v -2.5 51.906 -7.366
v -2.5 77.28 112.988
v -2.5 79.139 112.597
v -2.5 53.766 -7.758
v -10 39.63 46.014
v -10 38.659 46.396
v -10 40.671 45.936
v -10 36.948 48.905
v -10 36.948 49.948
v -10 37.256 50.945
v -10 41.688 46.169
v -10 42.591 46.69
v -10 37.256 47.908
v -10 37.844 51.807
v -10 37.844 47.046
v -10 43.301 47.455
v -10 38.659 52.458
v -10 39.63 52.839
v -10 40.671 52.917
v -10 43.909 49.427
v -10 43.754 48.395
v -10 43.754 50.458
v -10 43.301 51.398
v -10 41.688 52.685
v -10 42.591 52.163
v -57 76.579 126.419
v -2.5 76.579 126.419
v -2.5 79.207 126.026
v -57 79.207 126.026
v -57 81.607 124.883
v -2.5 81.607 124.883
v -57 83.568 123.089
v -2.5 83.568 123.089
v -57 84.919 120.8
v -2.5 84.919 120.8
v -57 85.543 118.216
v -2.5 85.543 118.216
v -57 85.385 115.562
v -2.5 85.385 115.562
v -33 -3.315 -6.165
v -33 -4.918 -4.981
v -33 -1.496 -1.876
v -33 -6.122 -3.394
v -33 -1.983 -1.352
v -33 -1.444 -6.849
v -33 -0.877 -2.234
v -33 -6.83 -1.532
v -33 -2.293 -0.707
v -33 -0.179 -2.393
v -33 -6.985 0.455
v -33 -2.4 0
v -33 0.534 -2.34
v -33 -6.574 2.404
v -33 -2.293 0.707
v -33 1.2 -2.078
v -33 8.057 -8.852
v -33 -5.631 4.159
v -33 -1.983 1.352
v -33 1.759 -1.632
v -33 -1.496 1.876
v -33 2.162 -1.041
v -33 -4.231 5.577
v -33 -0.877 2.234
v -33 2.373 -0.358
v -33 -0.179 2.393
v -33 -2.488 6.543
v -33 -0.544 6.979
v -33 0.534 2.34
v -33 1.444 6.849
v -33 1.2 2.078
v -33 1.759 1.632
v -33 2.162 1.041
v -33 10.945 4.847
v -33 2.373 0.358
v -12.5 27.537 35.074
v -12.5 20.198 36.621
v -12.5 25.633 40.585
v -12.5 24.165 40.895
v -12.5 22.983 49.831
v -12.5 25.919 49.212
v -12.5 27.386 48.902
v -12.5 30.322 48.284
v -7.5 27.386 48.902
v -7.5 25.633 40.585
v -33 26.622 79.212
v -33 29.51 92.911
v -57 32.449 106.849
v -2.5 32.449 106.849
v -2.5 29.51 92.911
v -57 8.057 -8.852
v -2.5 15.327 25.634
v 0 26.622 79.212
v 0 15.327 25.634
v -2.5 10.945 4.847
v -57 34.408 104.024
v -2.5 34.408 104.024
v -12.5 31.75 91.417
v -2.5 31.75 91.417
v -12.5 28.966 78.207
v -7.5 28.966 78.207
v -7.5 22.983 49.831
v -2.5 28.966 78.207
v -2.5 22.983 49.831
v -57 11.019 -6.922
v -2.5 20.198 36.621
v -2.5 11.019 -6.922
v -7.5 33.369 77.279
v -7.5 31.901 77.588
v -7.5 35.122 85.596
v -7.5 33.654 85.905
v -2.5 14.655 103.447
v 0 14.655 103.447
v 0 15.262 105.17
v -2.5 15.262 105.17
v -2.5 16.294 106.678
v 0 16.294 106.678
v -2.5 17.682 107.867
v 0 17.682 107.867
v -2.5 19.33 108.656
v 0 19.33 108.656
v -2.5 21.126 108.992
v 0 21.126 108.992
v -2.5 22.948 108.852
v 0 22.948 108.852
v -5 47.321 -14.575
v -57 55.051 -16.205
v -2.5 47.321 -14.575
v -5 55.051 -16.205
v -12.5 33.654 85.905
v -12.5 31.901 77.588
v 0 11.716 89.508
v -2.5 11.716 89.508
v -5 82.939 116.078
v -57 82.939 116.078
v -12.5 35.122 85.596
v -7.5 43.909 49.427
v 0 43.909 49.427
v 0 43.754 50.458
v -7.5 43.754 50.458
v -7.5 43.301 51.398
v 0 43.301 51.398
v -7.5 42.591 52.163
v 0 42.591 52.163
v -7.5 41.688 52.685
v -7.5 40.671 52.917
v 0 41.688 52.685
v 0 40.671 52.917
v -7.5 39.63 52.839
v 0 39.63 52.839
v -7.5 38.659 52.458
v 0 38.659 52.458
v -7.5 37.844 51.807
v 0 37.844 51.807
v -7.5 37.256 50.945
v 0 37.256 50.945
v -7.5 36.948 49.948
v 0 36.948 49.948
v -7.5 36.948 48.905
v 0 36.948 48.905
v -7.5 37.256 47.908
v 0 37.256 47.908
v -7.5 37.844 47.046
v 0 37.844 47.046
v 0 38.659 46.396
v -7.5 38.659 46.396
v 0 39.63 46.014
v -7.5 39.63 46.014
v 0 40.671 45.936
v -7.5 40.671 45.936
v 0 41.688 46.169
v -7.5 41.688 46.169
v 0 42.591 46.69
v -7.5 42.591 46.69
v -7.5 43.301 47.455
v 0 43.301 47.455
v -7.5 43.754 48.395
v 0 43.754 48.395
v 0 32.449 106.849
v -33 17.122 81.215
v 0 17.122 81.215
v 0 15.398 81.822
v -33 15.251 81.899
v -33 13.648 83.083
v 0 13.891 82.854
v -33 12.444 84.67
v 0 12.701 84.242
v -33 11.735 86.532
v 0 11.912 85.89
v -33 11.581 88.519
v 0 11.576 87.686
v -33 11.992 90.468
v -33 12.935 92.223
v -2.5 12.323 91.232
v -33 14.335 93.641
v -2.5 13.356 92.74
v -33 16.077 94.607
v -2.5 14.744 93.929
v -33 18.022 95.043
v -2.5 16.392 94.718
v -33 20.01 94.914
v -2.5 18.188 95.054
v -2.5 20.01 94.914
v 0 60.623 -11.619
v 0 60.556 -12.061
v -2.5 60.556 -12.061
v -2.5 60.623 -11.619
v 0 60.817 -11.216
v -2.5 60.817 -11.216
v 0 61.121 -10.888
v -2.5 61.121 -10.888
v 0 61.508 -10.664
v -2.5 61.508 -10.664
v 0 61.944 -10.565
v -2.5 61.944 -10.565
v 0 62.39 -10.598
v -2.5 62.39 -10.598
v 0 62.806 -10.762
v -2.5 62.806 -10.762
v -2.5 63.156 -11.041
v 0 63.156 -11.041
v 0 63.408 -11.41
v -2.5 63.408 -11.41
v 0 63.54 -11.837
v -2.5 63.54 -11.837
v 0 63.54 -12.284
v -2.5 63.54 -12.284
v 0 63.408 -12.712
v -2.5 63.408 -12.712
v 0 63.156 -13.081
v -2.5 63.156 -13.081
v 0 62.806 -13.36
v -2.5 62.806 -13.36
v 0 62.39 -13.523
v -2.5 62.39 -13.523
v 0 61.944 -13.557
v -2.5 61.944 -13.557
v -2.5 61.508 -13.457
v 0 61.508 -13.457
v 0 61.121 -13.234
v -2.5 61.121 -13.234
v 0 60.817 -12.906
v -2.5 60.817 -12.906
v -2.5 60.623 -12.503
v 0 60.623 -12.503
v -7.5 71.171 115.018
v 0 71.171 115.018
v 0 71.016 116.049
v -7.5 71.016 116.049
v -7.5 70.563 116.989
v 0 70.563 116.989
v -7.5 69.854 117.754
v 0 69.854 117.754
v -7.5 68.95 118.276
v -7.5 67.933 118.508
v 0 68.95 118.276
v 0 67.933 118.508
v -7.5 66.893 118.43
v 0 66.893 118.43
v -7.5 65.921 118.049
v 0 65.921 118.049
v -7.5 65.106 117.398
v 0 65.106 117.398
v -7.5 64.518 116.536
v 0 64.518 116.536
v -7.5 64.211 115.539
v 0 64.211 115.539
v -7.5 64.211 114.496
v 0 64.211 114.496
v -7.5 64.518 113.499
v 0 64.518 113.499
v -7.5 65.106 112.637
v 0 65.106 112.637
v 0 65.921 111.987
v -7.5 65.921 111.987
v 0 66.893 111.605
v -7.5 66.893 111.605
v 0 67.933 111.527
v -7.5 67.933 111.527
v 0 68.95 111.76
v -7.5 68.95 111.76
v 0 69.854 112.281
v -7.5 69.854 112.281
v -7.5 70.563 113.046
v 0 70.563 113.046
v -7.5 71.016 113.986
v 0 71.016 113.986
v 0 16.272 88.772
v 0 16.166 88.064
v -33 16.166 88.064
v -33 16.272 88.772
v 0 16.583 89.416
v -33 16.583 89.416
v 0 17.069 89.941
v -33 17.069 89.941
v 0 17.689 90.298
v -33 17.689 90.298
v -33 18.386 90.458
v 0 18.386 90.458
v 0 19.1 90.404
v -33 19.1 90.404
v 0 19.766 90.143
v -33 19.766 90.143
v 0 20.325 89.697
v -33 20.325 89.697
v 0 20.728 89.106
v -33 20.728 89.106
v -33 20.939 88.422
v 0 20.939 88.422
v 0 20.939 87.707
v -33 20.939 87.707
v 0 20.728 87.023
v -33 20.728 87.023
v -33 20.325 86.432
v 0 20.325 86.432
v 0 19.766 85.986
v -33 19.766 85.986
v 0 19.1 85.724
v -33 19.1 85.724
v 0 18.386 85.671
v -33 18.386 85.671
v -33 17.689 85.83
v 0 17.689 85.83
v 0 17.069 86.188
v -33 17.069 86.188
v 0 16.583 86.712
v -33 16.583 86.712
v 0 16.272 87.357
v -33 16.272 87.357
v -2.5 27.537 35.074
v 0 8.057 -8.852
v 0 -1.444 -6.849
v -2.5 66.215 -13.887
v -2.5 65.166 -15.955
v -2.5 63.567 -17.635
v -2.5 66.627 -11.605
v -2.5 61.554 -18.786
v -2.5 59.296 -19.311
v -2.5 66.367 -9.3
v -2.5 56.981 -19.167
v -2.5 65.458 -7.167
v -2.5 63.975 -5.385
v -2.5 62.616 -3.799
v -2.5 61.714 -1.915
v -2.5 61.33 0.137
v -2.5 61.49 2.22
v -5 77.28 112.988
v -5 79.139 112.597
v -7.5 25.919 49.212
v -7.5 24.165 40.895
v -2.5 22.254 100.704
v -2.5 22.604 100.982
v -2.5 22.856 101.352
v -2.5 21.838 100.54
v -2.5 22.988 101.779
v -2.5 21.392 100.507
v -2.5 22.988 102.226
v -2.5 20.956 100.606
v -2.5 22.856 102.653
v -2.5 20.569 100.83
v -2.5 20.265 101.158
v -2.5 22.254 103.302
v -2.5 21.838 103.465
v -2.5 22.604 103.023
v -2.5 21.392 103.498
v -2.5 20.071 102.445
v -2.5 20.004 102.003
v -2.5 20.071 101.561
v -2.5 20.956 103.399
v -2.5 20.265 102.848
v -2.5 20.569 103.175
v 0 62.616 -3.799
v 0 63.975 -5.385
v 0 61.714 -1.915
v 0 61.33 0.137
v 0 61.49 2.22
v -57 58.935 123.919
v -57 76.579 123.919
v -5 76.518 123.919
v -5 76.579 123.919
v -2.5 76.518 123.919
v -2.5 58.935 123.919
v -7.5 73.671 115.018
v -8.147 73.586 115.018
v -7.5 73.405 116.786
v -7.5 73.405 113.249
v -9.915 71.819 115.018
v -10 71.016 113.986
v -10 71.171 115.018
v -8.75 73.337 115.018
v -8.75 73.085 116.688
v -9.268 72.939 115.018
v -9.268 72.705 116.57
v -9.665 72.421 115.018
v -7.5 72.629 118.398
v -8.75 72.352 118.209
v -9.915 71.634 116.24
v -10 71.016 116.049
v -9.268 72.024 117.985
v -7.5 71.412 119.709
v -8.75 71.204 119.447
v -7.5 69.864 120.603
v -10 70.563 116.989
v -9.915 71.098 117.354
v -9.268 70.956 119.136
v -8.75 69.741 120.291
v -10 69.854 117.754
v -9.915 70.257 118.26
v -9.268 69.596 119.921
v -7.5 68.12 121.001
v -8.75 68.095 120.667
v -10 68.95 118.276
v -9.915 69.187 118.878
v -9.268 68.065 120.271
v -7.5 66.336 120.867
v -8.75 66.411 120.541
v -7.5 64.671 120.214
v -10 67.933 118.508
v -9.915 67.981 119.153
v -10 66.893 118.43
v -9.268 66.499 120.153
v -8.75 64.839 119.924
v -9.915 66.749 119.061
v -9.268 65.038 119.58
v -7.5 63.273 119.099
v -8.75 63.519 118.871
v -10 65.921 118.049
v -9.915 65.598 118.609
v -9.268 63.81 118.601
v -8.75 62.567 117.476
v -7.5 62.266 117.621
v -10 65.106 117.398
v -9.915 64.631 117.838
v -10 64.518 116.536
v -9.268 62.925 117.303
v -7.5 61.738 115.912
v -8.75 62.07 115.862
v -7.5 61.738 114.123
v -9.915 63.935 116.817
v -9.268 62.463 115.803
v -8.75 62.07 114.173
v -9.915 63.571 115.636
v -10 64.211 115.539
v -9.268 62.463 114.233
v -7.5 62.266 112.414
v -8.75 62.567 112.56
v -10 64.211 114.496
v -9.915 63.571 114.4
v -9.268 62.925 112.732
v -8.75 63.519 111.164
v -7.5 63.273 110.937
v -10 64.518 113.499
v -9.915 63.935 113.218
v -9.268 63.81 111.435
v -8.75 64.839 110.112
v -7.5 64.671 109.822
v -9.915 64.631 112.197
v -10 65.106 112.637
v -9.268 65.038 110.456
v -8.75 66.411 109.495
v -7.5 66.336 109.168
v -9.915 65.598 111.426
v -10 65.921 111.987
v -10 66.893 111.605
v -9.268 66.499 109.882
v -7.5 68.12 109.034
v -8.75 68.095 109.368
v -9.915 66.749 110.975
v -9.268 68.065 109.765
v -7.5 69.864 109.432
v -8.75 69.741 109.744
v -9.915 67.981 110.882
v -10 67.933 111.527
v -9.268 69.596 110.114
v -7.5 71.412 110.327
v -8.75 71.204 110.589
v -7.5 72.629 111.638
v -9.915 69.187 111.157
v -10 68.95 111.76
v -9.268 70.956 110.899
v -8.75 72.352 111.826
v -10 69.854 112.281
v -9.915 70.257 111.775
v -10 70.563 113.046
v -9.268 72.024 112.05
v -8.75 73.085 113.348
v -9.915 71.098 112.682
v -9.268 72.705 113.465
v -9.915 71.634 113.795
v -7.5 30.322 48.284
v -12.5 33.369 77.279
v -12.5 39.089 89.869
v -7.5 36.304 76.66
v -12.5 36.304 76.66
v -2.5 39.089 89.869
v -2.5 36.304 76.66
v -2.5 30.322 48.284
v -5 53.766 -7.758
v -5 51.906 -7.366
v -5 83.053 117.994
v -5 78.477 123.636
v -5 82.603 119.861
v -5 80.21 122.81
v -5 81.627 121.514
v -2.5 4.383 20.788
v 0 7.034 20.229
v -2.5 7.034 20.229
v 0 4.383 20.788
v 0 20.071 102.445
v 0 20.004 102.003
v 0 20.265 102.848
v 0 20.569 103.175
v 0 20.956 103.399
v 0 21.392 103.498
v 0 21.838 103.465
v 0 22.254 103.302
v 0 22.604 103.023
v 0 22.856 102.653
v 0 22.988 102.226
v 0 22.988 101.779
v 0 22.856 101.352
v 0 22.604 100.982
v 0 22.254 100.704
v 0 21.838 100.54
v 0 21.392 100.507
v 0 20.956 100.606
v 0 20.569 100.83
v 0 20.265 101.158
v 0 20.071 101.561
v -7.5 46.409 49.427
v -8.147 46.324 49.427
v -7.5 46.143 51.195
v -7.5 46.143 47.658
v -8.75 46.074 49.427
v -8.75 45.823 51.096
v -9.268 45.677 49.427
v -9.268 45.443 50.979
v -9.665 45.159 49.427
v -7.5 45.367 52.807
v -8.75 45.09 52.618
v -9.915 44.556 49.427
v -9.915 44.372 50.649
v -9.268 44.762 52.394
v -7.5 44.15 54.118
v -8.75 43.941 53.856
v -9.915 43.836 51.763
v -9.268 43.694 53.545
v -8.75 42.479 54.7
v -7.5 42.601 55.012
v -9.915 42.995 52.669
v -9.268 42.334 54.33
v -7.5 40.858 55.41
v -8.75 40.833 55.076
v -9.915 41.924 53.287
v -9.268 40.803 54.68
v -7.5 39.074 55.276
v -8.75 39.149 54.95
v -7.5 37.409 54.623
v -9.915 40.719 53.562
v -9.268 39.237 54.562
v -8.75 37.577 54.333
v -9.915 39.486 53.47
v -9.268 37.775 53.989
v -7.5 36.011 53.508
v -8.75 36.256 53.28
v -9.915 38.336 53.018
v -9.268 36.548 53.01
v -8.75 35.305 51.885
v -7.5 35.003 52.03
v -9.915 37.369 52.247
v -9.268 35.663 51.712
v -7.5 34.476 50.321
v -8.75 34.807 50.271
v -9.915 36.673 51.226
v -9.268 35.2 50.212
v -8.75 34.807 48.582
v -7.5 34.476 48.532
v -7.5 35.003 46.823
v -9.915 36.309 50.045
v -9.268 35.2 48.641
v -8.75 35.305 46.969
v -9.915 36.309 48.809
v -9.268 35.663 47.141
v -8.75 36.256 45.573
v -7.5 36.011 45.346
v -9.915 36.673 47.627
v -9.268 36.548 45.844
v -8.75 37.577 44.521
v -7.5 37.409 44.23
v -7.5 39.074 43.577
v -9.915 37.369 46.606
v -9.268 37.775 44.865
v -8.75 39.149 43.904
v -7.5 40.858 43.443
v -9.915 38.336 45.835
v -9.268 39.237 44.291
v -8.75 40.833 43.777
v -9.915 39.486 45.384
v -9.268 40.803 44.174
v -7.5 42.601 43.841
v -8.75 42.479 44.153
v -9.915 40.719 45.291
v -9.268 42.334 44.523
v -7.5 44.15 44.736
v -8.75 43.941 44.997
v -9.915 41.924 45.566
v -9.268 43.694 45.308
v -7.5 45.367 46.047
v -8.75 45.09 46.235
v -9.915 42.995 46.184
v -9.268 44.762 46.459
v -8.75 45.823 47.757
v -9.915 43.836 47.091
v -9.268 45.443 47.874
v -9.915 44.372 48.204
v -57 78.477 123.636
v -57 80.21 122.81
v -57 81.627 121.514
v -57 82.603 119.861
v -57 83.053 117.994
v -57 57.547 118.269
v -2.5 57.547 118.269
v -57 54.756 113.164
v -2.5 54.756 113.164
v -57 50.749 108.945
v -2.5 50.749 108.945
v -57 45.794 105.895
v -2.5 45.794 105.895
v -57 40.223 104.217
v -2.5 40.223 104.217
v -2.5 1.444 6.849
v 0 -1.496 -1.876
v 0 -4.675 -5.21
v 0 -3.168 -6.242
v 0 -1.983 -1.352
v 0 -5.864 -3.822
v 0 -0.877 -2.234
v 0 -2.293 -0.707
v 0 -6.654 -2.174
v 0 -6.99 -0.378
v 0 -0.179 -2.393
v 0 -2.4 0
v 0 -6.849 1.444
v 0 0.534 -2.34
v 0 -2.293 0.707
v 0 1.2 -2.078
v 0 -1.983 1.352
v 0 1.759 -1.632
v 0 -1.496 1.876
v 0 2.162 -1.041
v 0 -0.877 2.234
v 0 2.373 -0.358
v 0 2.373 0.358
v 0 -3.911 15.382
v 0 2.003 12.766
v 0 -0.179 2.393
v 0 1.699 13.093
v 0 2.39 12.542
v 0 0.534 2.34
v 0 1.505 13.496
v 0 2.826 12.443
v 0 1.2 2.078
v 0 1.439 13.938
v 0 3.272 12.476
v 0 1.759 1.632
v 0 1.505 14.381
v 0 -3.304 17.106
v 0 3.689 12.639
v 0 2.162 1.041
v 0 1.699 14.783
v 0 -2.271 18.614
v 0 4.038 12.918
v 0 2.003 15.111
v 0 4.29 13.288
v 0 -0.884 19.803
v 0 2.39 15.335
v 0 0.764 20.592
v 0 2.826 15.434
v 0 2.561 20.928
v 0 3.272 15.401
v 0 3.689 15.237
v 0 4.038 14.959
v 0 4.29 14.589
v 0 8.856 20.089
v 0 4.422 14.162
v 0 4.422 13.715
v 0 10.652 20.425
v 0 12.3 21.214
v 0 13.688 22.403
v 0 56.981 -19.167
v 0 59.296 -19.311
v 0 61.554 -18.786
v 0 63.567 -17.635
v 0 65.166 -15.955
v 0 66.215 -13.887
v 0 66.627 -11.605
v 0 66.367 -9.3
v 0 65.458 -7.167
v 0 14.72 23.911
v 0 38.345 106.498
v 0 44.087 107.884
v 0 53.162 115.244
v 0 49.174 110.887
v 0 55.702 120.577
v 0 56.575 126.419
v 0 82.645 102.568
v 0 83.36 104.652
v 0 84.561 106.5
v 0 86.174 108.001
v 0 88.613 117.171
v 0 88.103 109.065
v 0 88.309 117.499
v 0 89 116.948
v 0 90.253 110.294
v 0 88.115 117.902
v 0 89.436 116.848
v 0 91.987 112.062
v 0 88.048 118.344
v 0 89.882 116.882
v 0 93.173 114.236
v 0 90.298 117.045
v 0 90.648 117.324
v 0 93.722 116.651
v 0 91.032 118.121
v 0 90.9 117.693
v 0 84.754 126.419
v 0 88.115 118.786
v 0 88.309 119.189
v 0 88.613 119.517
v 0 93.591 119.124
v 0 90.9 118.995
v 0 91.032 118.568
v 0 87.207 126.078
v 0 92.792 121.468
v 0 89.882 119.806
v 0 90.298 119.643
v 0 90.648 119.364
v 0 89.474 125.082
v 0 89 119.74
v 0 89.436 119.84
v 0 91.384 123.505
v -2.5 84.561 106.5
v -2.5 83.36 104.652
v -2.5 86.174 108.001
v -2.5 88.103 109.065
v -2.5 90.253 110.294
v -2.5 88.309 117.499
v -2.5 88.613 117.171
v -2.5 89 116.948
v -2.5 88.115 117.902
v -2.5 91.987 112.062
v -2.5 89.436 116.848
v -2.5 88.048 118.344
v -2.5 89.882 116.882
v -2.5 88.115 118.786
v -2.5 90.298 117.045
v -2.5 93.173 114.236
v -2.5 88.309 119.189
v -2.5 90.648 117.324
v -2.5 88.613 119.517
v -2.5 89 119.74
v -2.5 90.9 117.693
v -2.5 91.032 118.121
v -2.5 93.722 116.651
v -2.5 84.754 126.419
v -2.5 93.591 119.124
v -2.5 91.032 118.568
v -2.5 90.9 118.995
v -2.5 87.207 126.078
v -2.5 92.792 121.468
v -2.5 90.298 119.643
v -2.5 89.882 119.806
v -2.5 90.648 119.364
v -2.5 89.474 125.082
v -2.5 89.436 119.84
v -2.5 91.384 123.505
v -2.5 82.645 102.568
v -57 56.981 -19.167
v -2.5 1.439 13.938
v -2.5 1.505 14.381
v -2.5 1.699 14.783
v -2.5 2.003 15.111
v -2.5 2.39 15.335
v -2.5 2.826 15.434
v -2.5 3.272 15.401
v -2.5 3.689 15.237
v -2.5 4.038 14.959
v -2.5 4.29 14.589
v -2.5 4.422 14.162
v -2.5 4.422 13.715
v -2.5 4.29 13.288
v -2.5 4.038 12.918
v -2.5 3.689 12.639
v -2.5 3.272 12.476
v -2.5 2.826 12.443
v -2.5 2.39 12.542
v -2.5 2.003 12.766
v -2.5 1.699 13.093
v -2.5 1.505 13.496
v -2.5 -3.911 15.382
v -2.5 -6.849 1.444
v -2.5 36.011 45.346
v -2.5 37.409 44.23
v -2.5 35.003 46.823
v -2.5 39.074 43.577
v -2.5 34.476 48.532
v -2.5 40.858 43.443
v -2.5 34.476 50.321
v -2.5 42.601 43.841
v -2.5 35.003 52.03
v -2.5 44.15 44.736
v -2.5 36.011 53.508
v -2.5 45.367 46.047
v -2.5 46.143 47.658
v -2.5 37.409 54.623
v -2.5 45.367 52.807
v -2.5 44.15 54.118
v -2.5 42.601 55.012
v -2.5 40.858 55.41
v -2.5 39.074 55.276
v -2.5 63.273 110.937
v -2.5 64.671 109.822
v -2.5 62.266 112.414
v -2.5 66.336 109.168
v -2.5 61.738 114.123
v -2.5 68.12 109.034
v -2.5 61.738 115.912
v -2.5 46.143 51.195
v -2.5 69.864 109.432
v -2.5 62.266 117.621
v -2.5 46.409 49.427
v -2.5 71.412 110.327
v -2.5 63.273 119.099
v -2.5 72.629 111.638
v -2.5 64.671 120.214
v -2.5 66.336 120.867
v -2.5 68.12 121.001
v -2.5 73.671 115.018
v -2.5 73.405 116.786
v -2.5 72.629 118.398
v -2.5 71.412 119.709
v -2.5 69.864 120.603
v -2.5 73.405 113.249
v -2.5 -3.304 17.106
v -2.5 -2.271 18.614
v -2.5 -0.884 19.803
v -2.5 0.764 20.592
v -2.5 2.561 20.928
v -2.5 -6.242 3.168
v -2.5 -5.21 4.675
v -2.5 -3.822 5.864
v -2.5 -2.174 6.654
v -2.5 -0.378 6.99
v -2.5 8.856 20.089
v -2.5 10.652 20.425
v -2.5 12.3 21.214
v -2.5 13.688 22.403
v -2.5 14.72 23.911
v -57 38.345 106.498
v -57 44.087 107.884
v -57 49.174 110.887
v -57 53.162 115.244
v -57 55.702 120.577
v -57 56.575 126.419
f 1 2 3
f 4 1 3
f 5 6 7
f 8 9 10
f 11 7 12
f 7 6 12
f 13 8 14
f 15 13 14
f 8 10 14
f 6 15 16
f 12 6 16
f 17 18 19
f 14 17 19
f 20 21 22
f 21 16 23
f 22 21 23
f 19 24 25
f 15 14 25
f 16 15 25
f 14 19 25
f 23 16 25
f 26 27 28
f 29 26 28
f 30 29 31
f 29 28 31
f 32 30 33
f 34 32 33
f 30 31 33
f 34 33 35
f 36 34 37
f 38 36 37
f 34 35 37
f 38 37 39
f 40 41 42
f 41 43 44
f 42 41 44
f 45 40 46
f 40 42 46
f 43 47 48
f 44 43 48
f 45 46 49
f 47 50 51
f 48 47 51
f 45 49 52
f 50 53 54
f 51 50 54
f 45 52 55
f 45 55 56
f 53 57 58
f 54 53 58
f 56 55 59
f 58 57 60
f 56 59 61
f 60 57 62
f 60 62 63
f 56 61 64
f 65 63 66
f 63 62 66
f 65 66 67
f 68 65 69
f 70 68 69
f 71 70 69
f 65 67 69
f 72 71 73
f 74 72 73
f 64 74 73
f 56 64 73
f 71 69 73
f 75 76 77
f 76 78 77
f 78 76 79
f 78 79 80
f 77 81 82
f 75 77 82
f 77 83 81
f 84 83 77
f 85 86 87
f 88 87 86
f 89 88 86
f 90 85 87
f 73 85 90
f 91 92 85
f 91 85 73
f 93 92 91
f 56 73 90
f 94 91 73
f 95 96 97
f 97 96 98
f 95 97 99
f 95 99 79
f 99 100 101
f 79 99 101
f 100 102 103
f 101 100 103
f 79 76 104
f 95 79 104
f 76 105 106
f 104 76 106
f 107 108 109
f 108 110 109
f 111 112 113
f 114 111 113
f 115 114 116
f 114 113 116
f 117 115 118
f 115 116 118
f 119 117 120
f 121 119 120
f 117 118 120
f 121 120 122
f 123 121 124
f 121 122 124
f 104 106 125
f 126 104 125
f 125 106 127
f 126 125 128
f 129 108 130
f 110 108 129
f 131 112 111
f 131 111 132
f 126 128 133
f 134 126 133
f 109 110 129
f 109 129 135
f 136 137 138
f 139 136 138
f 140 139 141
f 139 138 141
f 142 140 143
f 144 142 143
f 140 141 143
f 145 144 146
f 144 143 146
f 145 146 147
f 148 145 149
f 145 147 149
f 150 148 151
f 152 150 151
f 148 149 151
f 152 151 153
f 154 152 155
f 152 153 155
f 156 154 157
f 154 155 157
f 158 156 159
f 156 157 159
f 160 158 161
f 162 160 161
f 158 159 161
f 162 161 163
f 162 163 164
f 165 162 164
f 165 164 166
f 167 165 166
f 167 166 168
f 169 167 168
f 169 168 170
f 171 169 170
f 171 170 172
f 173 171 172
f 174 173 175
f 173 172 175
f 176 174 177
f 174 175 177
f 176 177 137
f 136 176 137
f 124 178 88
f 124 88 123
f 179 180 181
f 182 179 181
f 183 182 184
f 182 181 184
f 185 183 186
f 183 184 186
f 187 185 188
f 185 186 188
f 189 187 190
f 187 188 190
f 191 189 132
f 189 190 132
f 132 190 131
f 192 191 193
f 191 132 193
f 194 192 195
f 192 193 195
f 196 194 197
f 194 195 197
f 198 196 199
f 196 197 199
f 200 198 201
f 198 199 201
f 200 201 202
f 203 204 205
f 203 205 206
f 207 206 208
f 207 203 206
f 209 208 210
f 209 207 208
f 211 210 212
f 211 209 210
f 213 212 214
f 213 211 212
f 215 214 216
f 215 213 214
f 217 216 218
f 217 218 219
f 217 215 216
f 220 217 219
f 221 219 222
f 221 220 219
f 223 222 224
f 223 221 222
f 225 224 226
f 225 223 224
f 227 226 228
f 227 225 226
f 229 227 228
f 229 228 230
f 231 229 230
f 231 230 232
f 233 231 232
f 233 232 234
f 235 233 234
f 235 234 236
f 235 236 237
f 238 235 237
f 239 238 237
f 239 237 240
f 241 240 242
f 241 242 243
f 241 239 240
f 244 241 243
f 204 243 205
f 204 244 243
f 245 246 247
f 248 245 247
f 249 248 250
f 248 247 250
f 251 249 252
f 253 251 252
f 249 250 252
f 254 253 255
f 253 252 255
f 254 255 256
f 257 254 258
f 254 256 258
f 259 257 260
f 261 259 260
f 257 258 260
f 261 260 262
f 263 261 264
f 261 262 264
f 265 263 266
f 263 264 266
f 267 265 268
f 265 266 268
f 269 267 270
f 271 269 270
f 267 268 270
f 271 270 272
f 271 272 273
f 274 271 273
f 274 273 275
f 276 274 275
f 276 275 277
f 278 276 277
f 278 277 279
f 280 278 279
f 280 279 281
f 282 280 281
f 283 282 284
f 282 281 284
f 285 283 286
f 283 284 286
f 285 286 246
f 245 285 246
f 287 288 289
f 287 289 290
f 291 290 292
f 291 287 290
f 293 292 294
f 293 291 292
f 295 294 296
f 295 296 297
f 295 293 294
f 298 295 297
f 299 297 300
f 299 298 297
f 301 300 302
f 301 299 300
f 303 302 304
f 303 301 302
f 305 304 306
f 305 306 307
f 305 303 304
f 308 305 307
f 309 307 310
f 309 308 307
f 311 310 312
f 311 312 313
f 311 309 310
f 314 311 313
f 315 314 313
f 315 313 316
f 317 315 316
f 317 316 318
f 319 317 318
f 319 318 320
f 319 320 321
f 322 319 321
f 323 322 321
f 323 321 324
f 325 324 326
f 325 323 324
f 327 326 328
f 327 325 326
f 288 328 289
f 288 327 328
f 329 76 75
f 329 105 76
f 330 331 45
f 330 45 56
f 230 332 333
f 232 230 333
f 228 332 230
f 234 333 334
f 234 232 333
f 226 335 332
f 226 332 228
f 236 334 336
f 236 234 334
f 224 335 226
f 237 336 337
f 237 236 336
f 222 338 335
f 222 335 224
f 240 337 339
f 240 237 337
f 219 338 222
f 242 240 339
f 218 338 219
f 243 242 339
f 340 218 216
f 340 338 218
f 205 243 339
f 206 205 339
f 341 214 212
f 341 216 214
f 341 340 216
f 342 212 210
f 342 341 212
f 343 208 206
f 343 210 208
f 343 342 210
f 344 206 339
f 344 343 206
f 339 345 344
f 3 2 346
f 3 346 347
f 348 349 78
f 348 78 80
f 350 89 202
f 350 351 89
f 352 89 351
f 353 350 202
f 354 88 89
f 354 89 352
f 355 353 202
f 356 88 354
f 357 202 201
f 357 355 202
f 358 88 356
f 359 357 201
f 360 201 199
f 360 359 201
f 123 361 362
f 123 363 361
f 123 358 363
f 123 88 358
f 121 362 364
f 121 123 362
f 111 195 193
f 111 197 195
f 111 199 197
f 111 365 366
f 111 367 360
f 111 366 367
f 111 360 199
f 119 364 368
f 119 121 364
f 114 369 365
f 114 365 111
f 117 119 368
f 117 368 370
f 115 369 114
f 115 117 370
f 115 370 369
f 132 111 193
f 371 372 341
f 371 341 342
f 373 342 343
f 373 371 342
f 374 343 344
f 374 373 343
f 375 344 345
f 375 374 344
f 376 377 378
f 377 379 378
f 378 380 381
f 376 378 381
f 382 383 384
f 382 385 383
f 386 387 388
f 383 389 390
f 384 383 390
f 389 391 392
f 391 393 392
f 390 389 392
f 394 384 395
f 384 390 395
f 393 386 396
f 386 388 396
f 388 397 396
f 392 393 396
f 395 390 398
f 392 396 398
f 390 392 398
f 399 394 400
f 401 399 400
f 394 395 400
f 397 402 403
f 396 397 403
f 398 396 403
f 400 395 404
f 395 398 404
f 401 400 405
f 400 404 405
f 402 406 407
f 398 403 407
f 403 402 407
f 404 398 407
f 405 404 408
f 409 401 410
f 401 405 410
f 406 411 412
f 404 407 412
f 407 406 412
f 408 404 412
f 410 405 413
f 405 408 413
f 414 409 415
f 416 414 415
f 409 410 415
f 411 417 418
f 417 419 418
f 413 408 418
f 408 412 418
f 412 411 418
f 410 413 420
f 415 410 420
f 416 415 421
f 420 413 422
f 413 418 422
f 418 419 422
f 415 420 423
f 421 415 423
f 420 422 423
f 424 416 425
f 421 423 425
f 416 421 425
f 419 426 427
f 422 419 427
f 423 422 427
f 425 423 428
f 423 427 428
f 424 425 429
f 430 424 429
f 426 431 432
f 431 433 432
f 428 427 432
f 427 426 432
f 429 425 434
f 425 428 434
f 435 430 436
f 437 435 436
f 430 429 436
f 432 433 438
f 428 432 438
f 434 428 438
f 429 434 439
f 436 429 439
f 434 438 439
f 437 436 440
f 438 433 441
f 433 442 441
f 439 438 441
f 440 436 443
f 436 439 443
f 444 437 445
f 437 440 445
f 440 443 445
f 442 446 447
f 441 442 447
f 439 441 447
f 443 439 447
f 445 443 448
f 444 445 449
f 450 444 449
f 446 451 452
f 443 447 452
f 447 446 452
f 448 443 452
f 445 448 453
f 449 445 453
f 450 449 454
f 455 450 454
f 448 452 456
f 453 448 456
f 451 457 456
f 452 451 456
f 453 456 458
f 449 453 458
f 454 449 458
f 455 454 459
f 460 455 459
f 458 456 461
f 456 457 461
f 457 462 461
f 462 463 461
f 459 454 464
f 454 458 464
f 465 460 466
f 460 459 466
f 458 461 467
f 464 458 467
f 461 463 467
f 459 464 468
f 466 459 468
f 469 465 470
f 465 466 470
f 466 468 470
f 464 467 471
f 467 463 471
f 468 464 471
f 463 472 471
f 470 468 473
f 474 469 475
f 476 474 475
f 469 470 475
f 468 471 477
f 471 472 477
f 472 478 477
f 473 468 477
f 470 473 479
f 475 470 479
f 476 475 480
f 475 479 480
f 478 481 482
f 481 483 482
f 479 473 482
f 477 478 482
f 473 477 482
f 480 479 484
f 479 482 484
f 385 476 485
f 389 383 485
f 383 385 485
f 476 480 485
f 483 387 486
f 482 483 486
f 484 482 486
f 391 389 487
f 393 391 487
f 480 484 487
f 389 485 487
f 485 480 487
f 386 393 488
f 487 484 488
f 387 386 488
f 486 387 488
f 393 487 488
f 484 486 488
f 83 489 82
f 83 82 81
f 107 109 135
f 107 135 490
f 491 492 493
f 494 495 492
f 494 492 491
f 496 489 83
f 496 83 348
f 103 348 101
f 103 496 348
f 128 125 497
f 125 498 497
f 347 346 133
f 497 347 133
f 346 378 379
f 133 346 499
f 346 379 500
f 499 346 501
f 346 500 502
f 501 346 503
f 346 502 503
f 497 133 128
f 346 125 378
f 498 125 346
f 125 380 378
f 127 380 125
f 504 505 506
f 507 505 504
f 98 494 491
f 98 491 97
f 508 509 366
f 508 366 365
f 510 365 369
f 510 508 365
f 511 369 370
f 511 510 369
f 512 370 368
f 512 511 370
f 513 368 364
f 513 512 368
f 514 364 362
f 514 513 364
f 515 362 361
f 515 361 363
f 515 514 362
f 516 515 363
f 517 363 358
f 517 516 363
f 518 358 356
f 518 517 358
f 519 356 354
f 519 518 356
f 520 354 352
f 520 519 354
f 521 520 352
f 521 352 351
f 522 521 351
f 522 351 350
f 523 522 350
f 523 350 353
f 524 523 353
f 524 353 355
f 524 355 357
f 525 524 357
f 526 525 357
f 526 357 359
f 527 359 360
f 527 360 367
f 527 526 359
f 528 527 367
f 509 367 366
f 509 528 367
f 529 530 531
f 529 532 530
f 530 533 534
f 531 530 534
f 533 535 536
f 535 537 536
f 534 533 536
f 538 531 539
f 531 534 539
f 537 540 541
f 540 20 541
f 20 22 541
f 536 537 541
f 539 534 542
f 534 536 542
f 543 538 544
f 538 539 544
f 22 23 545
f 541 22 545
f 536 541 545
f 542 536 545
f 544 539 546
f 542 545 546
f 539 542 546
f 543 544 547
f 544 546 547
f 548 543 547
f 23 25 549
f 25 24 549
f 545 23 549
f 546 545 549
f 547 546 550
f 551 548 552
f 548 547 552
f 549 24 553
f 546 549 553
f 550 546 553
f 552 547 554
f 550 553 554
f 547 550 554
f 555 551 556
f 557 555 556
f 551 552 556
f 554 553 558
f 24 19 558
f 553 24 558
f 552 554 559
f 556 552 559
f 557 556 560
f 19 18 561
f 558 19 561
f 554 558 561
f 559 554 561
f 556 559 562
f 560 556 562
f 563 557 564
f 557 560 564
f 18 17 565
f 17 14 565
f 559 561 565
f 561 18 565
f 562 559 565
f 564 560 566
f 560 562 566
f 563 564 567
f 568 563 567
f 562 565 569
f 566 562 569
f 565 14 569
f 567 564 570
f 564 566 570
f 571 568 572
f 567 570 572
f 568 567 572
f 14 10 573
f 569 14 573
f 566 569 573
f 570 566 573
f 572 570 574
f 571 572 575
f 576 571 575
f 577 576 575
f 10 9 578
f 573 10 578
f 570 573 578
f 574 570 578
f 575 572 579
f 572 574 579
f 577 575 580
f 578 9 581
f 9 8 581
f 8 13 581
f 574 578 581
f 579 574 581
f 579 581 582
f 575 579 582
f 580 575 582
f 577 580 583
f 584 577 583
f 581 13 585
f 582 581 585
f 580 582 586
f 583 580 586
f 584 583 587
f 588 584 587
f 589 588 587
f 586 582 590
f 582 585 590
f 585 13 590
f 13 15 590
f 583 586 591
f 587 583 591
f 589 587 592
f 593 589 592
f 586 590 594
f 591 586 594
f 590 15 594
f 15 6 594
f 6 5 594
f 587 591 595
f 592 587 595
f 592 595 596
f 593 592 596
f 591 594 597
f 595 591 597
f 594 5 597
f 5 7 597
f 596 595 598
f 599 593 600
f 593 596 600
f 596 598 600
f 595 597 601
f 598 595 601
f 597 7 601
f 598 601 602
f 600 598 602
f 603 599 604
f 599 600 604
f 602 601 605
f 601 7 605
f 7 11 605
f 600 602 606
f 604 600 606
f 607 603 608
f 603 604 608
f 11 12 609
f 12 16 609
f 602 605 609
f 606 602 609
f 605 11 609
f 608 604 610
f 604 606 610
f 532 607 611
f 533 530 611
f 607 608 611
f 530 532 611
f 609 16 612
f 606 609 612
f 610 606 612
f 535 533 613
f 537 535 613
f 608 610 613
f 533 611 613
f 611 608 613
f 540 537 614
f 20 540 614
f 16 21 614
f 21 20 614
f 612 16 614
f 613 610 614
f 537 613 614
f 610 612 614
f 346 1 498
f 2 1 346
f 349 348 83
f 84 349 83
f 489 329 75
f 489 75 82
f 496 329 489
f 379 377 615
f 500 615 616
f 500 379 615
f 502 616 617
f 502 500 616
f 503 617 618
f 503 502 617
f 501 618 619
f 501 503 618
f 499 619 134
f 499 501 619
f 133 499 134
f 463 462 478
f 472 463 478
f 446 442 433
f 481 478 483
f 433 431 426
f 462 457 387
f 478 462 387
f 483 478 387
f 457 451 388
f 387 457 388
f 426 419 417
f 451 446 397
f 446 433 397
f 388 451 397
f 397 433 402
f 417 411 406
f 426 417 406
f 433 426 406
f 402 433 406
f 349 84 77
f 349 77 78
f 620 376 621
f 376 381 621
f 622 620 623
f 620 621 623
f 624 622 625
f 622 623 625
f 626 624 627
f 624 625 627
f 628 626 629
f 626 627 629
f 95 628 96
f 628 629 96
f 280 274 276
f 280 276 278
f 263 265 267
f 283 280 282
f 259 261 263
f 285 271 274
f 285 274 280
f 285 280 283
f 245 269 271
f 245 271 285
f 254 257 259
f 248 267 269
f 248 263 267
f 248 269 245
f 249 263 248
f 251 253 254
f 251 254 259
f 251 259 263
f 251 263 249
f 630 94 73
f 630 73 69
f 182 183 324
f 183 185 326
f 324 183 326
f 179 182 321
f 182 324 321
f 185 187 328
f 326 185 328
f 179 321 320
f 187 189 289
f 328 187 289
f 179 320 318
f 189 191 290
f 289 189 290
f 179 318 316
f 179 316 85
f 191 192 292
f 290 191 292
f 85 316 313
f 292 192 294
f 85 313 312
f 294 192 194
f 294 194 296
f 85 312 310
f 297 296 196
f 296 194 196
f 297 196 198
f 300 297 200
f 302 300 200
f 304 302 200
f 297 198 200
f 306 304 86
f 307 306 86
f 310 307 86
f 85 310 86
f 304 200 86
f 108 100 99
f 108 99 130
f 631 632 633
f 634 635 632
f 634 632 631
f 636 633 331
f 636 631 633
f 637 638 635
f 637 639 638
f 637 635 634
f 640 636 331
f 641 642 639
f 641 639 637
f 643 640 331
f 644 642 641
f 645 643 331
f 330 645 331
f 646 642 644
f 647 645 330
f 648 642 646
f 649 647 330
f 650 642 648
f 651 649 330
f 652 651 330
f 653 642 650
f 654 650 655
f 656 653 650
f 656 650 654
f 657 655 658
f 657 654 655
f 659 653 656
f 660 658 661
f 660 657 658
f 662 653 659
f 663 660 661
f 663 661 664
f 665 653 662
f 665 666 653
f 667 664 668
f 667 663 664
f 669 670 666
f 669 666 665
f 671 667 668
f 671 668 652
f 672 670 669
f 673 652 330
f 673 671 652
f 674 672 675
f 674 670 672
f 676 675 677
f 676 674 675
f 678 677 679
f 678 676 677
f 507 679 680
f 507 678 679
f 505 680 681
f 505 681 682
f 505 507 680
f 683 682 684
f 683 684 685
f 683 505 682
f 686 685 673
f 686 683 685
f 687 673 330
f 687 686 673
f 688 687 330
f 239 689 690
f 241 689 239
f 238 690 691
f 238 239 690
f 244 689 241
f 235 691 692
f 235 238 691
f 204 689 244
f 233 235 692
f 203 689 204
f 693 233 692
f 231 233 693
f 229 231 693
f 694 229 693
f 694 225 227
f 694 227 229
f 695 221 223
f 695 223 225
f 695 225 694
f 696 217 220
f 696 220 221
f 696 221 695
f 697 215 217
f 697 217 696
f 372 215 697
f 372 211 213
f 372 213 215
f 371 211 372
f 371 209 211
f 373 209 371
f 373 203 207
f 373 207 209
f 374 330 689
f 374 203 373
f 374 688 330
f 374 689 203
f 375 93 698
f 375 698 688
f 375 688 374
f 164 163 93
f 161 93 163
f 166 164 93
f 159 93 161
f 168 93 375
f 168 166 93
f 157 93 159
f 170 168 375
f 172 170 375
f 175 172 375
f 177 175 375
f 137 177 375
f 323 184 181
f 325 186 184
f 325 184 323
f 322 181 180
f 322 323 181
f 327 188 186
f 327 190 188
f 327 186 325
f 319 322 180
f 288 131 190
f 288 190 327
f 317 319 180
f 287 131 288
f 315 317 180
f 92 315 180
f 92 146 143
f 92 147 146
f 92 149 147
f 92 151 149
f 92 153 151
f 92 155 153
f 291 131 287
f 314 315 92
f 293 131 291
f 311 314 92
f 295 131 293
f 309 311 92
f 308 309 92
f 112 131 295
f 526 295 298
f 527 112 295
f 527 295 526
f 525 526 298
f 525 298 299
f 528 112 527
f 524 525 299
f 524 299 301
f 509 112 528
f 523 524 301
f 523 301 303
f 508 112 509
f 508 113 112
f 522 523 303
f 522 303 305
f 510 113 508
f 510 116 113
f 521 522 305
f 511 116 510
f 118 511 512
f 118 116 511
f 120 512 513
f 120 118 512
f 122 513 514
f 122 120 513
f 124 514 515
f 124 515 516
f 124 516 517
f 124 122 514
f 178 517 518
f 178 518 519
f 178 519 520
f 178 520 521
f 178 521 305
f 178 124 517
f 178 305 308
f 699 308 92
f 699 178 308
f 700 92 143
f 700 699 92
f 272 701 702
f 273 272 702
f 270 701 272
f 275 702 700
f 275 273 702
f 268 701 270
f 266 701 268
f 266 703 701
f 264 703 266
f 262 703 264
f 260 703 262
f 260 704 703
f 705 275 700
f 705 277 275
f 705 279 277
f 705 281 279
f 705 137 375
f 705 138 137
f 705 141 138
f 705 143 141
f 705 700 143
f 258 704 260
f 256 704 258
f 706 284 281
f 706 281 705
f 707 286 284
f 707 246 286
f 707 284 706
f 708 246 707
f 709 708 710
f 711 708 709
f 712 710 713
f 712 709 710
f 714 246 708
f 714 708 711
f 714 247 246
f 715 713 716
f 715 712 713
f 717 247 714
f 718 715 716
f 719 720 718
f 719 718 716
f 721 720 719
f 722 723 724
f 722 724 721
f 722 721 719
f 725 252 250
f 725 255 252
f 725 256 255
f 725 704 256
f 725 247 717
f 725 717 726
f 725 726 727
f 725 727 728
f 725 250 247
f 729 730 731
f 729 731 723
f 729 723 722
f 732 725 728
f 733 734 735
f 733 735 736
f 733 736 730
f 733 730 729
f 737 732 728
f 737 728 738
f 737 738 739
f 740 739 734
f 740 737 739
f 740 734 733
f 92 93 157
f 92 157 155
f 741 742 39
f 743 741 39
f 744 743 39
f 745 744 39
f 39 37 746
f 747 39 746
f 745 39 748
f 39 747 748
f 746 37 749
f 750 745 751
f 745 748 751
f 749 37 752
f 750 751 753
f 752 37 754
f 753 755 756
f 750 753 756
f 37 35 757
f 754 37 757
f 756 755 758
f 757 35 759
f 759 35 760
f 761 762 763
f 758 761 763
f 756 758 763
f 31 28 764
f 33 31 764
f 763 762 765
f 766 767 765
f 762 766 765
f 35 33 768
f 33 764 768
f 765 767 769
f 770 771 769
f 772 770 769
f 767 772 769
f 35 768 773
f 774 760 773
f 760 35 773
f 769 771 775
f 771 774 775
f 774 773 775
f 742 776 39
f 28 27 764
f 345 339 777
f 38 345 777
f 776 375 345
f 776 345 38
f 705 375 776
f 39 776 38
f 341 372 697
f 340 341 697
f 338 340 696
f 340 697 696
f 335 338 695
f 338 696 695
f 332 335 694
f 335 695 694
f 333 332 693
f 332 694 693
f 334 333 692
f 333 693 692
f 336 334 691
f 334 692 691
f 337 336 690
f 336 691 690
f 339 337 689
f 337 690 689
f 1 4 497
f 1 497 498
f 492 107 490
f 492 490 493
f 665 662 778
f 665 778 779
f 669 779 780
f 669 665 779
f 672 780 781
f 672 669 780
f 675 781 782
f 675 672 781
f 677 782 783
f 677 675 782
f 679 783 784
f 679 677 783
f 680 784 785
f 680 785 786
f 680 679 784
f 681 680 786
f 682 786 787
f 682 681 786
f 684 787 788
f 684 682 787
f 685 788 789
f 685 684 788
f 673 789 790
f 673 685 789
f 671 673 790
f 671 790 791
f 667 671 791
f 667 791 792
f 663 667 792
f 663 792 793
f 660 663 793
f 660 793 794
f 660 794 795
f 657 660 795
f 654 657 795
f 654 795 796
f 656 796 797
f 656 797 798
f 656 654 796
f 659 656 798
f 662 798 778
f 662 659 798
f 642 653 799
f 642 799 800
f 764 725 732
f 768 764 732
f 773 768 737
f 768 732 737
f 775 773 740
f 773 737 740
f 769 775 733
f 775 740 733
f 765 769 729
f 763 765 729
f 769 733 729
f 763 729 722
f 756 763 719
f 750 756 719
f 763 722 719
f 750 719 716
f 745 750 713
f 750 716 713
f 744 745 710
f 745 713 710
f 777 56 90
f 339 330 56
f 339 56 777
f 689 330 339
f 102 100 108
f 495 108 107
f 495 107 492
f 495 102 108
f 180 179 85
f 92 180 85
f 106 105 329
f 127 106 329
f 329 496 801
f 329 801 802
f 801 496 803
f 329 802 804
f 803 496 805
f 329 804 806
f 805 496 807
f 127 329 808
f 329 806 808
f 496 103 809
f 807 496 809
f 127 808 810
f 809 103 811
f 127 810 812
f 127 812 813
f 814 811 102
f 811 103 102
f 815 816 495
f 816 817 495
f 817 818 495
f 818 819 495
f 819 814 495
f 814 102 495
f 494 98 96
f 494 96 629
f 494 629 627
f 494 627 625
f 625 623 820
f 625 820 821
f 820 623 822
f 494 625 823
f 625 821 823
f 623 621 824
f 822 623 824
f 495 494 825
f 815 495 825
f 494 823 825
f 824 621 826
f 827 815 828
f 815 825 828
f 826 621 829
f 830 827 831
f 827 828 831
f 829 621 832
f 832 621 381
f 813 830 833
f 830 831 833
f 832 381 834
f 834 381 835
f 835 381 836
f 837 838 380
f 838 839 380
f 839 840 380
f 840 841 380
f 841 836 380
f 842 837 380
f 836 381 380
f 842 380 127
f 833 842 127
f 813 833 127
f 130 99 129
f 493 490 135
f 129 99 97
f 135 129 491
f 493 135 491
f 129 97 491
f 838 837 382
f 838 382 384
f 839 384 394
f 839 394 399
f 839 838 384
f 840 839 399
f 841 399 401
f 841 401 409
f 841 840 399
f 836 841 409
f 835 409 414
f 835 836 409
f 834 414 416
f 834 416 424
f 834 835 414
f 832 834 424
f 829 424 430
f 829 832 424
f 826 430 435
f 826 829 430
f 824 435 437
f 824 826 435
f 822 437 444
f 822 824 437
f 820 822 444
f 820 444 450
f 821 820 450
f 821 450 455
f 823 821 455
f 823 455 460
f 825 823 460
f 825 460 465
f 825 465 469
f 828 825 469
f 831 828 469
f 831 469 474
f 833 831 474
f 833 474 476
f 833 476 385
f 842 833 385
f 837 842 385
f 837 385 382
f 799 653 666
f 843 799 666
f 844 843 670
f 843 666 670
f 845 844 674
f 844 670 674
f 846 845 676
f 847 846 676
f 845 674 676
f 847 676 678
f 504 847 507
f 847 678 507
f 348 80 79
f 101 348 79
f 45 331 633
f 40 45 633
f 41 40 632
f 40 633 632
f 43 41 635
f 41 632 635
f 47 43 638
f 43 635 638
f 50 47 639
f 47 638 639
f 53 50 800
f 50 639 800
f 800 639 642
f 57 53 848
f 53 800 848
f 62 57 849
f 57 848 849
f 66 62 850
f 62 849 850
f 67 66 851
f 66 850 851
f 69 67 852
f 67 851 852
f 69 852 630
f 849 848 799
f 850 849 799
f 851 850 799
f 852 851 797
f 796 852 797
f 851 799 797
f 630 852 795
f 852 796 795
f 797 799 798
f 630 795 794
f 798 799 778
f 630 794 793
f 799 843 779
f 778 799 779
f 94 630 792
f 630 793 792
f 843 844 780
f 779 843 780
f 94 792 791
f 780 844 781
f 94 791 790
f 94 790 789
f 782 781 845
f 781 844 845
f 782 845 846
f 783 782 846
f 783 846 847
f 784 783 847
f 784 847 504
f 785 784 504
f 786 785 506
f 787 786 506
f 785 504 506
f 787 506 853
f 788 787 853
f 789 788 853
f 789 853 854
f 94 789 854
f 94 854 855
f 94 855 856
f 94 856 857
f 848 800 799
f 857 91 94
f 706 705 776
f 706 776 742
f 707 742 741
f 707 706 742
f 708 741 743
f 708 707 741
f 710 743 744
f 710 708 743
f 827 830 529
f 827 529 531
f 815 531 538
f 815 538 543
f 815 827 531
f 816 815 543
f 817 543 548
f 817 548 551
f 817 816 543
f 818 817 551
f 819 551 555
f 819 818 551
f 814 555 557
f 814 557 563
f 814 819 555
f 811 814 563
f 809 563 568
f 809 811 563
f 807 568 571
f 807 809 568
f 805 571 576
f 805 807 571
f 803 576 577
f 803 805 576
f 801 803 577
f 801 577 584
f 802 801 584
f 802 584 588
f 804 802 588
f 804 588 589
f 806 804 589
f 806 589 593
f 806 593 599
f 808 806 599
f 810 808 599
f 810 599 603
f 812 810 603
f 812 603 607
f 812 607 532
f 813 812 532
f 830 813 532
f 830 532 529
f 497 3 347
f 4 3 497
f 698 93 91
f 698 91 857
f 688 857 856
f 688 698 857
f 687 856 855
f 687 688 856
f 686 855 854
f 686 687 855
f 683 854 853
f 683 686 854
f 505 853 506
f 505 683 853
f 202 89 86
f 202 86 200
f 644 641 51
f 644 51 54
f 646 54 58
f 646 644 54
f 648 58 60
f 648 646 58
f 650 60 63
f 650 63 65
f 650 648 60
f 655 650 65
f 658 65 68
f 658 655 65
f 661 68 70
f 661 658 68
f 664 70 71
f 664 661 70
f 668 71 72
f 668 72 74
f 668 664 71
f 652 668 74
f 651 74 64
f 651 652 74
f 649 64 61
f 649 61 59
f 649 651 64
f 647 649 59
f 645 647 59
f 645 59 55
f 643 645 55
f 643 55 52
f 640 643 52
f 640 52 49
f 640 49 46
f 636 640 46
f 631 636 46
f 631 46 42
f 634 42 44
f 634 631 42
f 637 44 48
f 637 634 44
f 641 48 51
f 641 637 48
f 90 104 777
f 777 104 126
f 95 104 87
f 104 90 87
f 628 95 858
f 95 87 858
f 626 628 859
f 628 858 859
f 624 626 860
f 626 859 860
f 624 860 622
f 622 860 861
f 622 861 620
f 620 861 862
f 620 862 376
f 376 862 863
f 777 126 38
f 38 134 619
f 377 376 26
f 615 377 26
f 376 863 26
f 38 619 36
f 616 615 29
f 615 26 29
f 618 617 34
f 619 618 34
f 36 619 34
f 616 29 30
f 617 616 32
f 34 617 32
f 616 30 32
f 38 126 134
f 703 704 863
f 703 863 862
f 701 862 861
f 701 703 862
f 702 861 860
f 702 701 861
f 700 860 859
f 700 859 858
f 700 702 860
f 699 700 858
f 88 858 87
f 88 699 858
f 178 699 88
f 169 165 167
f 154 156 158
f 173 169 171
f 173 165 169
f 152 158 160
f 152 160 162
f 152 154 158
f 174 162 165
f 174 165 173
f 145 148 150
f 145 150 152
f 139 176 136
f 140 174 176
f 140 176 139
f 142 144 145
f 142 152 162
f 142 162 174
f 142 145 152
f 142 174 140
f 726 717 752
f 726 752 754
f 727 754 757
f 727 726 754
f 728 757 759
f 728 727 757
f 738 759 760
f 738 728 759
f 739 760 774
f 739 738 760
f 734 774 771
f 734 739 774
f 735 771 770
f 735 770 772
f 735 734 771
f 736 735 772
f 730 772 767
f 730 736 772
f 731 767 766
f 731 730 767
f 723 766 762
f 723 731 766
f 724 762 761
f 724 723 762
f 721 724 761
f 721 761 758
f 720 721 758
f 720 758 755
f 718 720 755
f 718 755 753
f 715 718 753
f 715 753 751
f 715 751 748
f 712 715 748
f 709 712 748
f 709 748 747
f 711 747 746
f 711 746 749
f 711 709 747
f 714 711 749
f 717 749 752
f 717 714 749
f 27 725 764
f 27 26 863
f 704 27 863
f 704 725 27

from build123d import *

# Parameters (mm, degrees)
PAD009_DEPTH    = 57
SKETCH031_R     = 3.5
POCKET005_DEPTH = 7.5
THICKNESS_T     = -2.5
SKETCH032_R     = 1.5
PAD010_DEPTH    = 2.5
SKETCH033_R     = 2.4
PAD011_DEPTH    = 33
PAD012_DEPTH    = 2.5
PAD013_DEPTH    = 5
PAD014_DEPTH    = 5


with BuildPart() as part:
    # Sketch030 → Pad009 (new body)
    with BuildSketch(Plane(origin=(0, 0, 0), x_dir=(0, -1, 0), z_dir=(-1, 0, 0))):
        with BuildLine():
            Line((-56.9812455945, -19.1666932293), (-85.3849313131, 115.5624248602))
            ThreePointArc((-76.5785062018, 126.4190014838), (-83.5681124, 123.0886932914), (-85.3849313131, 115.5624248602))
            Line((-76.5785062018, 126.4190014838), (-56.5746674209, 126.4190014838))
            ThreePointArc((-56.5746674209, 126.4190014838), (-49.173982549, 110.8865432655), (-32.4489415907, 106.8491679032))
            Line((-32.4489415907, 106.8491679032), (-8.0566616429, -8.8523786537))
            Line((-8.0566616429, -8.8523786537), (-56.9812455945, -19.1666932293))
        make_face()
    extrude(amount=PAD009_DEPTH)

    # Sketch031 → Pocket005 (cut)
    with BuildSketch(Plane.YZ):
        with Locations((40.4092527683, 49.4266176238)):
            Circle(SKETCH031_R)
        with Locations((67.6714613195, 115.017708736)):
            Circle(SKETCH031_R)
    extrude(amount=-POCKET005_DEPTH, mode=Mode.SUBTRACT)

    # Thickness
    thickness_openings = [part.faces().sort_by_distance(p)[0] for p in [
        (-57, 47.670985, 52.690427),
    ]]
    offset(amount=THICKNESS_T, openings=thickness_openings)

    # Sketch032 → Pad010 (join)
    with BuildSketch(Plane(origin=(0, 0, 0), x_dir=(0, -1, 0), z_dir=(-1, 0, 0))):
        with BuildLine():
            ThreePointArc((-76.5785062018, 126.4190014838), (-83.5681124, 123.0886932914), (-85.3849313131, 115.5624248602))
            Line((-85.3849313131, 115.5624248602), (-82.6454361548, 102.5679927173))
            ThreePointArc((-82.6454361548, 102.5679927173), (-84.5605229517, 106.5001513818), (-88.1031081238, 109.0652087887))
            ThreePointArc((-84.7543549815, 126.4190014838), (-93.5913265854, 119.1242677012), (-88.1031081238, 109.0652087887))
            Line((-84.7543549815, 126.4190014838), (-76.5785062018, 126.4190014838))
        make_face()
        with Locations((-89.5482969155, 118.3440861841)):
            Circle(SKETCH032_R, mode=Mode.SUBTRACT)
        with BuildLine():
            ThreePointArc((-14.6548301134, 103.446667091), (-17.6820502047, 107.8670148106), (-22.9482759072, 108.8521048036))
            Line((-32.4489415907, 106.8491679032), (-22.9482759072, 108.8521048036))
            Line((-32.4489415907, 106.8491679032), (-29.5104359602, 92.9107559656))
            Line((-29.5104359602, 92.9107559656), (-20.0097702767, 94.9136928661))
            ThreePointArc((-11.7163244829, 89.5082551534), (-14.7435445743, 93.928602873), (-20.0097702767, 94.9136928661))
            Line((-14.6548301134, 103.446667091), (-11.7163244829, 89.5082551534))
        make_face()
        with Locations((-21.5042718666, 102.0026630504)):
            Circle(SKETCH032_R, mode=Mode.SUBTRACT)
        with BuildLine():
            ThreePointArc((-15.3271793951, 25.6343585435), (-12.2999593038, 21.2140108239), (-7.0337336013, 20.2289208309))
            Line((-7.0337336013, 20.2289208309), (-4.382509671, 20.7878536908))
            ThreePointArc((3.9109361228, 15.3824159782), (0.8837160314, 19.8027636978), (-4.382509671, 20.7878536908))
            Line((3.9109361228, 15.3824159782), (6.8494417532, 1.4440040406))
            ThreePointArc((6.8494417532, 1.4440040406), (3.8222216619, 5.8643517602), (-1.4440040406, 6.8494417532))
            Line((-10.9446697241, 4.8465048527), (-1.4440040406, 6.8494417532))
            Line((-15.3271793951, 25.6343585435), (-10.9446697241, 4.8465048527))
        make_face()
        with Locations((-2.9385056304, 13.9384119376)):
            Circle(SKETCH032_R, mode=Mode.SUBTRACT)
        with BuildLine():
            ThreePointArc((-63.9746959939, -5.3847157517), (-65.7656124274, -14.9588361058), (-56.9812455945, -19.1666932293))
            Line((-61.489922629, 2.2196186258), (-56.9812455945, -19.1666932293))
            ThreePointArc((-63.9746959939, -5.3847157517), (-61.7135216838, -1.9154450712), (-61.489922629, 2.2196186258))
        make_face()
        with Locations((-62.0562568032, -12.0607618174)):
            Circle(SKETCH032_R, mode=Mode.SUBTRACT)
    extrude(amount=PAD010_DEPTH)

    # Sketch033 → Pad011 (join)
    with BuildSketch(Plane(origin=(0, 0, 0), x_dir=(0, -1, 0), z_dir=(-1, 0, 0))):
        with BuildLine():
            Line((-29.5104359602, 92.9107559656), (-20.0097702767, 94.9136928661))
            ThreePointArc((-17.1217621955, 81.2148093596), (-11.7163244829, 89.5082551534), (-20.0097702767, 94.9136928661))
            Line((-17.1217621955, 81.2148093596), (-26.6224278791, 79.2118724591))
            Line((-29.5104359602, 92.9107559656), (-26.6224278791, 79.2118724591))
        make_face()
        with Locations((-18.5657662361, 88.0642511128)):
            Circle(SKETCH033_R, mode=Mode.SUBTRACT)
        with BuildLine():
            Line((-10.9446697241, 4.8465048527), (-1.4440040406, 6.8494417532))
            ThreePointArc((1.4440040406, -6.8494417532), (6.8494417532, 1.4440040406), (-1.4440040406, 6.8494417532))
            Line((1.4440040406, -6.8494417532), (-8.0566616429, -8.8523786537))
            Line((-10.9446697241, 4.8465048527), (-8.0566616429, -8.8523786537))
        make_face()
        Circle(SKETCH033_R, mode=Mode.SUBTRACT)
    extrude(amount=PAD011_DEPTH)

    # Sketch035 (on Face2 of Pad011) → Pad012 (join)
    with BuildSketch(Plane(origin=(-2.5, 0, 0), x_dir=(0, -1, 0), z_dir=(-1, 0, 0))):
        with BuildLine():
            Line((-47.3206478613, -14.5750866), (-55.0507321257, -16.204748303))
            Line((-55.0507321257, -16.204748303), (-82.9387021155, 116.0781405889))
            ThreePointArc((-76.5785062018, 123.9190014838), (-81.6265551227, 121.5137789004), (-82.9387021155, 116.0781405889))
            Line((-76.5785062018, 123.9190014838), (-76.5180671542, 123.9190014838))
            Line((-76.5180671542, 123.9190014838), (-47.3206478613, -14.5750866))
        make_face()
        Polygon((-77.2796270866, 112.9884644786), (-79.1387612768, 112.5965205247), (-53.7655474207, -7.7579559962), (-51.9064132305, -7.3660120423), align=None, mode=Mode.SUBTRACT)
    extrude(amount=PAD012_DEPTH)

    # Sketch037 (on Face2 of Pad011) → Pad013 (join)
    with BuildSketch(Plane(origin=(-2.5, 0, 0), x_dir=(0, -1, 0), z_dir=(-1, 0, 0))):
        Polygon((-20.1983465416, 36.621014532), (-27.5370341343, 35.0738673456), (-30.3218990697, 48.2835050126), (-22.983211477, 49.8306521989), align=None)
        Polygon((-39.089066459, 89.8694013714), (-31.7503788663, 91.4165485578), (-28.9655139309, 78.2069108908), (-36.3042015236, 76.6597637045), align=None)
    extrude(amount=PAD013_DEPTH)

    # Sketch036 (on Face2 of Pad011) → Pad014 (join)
    with BuildSketch(Plane(origin=(-7.5, 0, 0), x_dir=(0, -1, 0), z_dir=(-1, 0, 0))):
        Polygon((-20.1983465416, 36.621014532), (-27.5370341343, 35.0738673456), (-30.3218990697, 48.2835050126), (-27.3864240326, 48.9023638871), (-25.6329905548, 40.5851846153), (-24.1652530362, 40.8946140526), (-25.9186865141, 49.2117933244), (-22.983211477, 49.8306521989), align=None)
        Polygon((-39.089066459, 89.8694013714), (-31.7503788663, 91.4165485578), (-28.9655139309, 78.2069108908), (-31.900988968, 77.5880520163), (-33.6544224458, 85.9052312881), (-35.1221599644, 85.5958018508), (-33.3687264865, 77.278622579), (-36.3042015236, 76.6597637045), align=None)
    extrude(amount=PAD014_DEPTH)


solid = part.part
